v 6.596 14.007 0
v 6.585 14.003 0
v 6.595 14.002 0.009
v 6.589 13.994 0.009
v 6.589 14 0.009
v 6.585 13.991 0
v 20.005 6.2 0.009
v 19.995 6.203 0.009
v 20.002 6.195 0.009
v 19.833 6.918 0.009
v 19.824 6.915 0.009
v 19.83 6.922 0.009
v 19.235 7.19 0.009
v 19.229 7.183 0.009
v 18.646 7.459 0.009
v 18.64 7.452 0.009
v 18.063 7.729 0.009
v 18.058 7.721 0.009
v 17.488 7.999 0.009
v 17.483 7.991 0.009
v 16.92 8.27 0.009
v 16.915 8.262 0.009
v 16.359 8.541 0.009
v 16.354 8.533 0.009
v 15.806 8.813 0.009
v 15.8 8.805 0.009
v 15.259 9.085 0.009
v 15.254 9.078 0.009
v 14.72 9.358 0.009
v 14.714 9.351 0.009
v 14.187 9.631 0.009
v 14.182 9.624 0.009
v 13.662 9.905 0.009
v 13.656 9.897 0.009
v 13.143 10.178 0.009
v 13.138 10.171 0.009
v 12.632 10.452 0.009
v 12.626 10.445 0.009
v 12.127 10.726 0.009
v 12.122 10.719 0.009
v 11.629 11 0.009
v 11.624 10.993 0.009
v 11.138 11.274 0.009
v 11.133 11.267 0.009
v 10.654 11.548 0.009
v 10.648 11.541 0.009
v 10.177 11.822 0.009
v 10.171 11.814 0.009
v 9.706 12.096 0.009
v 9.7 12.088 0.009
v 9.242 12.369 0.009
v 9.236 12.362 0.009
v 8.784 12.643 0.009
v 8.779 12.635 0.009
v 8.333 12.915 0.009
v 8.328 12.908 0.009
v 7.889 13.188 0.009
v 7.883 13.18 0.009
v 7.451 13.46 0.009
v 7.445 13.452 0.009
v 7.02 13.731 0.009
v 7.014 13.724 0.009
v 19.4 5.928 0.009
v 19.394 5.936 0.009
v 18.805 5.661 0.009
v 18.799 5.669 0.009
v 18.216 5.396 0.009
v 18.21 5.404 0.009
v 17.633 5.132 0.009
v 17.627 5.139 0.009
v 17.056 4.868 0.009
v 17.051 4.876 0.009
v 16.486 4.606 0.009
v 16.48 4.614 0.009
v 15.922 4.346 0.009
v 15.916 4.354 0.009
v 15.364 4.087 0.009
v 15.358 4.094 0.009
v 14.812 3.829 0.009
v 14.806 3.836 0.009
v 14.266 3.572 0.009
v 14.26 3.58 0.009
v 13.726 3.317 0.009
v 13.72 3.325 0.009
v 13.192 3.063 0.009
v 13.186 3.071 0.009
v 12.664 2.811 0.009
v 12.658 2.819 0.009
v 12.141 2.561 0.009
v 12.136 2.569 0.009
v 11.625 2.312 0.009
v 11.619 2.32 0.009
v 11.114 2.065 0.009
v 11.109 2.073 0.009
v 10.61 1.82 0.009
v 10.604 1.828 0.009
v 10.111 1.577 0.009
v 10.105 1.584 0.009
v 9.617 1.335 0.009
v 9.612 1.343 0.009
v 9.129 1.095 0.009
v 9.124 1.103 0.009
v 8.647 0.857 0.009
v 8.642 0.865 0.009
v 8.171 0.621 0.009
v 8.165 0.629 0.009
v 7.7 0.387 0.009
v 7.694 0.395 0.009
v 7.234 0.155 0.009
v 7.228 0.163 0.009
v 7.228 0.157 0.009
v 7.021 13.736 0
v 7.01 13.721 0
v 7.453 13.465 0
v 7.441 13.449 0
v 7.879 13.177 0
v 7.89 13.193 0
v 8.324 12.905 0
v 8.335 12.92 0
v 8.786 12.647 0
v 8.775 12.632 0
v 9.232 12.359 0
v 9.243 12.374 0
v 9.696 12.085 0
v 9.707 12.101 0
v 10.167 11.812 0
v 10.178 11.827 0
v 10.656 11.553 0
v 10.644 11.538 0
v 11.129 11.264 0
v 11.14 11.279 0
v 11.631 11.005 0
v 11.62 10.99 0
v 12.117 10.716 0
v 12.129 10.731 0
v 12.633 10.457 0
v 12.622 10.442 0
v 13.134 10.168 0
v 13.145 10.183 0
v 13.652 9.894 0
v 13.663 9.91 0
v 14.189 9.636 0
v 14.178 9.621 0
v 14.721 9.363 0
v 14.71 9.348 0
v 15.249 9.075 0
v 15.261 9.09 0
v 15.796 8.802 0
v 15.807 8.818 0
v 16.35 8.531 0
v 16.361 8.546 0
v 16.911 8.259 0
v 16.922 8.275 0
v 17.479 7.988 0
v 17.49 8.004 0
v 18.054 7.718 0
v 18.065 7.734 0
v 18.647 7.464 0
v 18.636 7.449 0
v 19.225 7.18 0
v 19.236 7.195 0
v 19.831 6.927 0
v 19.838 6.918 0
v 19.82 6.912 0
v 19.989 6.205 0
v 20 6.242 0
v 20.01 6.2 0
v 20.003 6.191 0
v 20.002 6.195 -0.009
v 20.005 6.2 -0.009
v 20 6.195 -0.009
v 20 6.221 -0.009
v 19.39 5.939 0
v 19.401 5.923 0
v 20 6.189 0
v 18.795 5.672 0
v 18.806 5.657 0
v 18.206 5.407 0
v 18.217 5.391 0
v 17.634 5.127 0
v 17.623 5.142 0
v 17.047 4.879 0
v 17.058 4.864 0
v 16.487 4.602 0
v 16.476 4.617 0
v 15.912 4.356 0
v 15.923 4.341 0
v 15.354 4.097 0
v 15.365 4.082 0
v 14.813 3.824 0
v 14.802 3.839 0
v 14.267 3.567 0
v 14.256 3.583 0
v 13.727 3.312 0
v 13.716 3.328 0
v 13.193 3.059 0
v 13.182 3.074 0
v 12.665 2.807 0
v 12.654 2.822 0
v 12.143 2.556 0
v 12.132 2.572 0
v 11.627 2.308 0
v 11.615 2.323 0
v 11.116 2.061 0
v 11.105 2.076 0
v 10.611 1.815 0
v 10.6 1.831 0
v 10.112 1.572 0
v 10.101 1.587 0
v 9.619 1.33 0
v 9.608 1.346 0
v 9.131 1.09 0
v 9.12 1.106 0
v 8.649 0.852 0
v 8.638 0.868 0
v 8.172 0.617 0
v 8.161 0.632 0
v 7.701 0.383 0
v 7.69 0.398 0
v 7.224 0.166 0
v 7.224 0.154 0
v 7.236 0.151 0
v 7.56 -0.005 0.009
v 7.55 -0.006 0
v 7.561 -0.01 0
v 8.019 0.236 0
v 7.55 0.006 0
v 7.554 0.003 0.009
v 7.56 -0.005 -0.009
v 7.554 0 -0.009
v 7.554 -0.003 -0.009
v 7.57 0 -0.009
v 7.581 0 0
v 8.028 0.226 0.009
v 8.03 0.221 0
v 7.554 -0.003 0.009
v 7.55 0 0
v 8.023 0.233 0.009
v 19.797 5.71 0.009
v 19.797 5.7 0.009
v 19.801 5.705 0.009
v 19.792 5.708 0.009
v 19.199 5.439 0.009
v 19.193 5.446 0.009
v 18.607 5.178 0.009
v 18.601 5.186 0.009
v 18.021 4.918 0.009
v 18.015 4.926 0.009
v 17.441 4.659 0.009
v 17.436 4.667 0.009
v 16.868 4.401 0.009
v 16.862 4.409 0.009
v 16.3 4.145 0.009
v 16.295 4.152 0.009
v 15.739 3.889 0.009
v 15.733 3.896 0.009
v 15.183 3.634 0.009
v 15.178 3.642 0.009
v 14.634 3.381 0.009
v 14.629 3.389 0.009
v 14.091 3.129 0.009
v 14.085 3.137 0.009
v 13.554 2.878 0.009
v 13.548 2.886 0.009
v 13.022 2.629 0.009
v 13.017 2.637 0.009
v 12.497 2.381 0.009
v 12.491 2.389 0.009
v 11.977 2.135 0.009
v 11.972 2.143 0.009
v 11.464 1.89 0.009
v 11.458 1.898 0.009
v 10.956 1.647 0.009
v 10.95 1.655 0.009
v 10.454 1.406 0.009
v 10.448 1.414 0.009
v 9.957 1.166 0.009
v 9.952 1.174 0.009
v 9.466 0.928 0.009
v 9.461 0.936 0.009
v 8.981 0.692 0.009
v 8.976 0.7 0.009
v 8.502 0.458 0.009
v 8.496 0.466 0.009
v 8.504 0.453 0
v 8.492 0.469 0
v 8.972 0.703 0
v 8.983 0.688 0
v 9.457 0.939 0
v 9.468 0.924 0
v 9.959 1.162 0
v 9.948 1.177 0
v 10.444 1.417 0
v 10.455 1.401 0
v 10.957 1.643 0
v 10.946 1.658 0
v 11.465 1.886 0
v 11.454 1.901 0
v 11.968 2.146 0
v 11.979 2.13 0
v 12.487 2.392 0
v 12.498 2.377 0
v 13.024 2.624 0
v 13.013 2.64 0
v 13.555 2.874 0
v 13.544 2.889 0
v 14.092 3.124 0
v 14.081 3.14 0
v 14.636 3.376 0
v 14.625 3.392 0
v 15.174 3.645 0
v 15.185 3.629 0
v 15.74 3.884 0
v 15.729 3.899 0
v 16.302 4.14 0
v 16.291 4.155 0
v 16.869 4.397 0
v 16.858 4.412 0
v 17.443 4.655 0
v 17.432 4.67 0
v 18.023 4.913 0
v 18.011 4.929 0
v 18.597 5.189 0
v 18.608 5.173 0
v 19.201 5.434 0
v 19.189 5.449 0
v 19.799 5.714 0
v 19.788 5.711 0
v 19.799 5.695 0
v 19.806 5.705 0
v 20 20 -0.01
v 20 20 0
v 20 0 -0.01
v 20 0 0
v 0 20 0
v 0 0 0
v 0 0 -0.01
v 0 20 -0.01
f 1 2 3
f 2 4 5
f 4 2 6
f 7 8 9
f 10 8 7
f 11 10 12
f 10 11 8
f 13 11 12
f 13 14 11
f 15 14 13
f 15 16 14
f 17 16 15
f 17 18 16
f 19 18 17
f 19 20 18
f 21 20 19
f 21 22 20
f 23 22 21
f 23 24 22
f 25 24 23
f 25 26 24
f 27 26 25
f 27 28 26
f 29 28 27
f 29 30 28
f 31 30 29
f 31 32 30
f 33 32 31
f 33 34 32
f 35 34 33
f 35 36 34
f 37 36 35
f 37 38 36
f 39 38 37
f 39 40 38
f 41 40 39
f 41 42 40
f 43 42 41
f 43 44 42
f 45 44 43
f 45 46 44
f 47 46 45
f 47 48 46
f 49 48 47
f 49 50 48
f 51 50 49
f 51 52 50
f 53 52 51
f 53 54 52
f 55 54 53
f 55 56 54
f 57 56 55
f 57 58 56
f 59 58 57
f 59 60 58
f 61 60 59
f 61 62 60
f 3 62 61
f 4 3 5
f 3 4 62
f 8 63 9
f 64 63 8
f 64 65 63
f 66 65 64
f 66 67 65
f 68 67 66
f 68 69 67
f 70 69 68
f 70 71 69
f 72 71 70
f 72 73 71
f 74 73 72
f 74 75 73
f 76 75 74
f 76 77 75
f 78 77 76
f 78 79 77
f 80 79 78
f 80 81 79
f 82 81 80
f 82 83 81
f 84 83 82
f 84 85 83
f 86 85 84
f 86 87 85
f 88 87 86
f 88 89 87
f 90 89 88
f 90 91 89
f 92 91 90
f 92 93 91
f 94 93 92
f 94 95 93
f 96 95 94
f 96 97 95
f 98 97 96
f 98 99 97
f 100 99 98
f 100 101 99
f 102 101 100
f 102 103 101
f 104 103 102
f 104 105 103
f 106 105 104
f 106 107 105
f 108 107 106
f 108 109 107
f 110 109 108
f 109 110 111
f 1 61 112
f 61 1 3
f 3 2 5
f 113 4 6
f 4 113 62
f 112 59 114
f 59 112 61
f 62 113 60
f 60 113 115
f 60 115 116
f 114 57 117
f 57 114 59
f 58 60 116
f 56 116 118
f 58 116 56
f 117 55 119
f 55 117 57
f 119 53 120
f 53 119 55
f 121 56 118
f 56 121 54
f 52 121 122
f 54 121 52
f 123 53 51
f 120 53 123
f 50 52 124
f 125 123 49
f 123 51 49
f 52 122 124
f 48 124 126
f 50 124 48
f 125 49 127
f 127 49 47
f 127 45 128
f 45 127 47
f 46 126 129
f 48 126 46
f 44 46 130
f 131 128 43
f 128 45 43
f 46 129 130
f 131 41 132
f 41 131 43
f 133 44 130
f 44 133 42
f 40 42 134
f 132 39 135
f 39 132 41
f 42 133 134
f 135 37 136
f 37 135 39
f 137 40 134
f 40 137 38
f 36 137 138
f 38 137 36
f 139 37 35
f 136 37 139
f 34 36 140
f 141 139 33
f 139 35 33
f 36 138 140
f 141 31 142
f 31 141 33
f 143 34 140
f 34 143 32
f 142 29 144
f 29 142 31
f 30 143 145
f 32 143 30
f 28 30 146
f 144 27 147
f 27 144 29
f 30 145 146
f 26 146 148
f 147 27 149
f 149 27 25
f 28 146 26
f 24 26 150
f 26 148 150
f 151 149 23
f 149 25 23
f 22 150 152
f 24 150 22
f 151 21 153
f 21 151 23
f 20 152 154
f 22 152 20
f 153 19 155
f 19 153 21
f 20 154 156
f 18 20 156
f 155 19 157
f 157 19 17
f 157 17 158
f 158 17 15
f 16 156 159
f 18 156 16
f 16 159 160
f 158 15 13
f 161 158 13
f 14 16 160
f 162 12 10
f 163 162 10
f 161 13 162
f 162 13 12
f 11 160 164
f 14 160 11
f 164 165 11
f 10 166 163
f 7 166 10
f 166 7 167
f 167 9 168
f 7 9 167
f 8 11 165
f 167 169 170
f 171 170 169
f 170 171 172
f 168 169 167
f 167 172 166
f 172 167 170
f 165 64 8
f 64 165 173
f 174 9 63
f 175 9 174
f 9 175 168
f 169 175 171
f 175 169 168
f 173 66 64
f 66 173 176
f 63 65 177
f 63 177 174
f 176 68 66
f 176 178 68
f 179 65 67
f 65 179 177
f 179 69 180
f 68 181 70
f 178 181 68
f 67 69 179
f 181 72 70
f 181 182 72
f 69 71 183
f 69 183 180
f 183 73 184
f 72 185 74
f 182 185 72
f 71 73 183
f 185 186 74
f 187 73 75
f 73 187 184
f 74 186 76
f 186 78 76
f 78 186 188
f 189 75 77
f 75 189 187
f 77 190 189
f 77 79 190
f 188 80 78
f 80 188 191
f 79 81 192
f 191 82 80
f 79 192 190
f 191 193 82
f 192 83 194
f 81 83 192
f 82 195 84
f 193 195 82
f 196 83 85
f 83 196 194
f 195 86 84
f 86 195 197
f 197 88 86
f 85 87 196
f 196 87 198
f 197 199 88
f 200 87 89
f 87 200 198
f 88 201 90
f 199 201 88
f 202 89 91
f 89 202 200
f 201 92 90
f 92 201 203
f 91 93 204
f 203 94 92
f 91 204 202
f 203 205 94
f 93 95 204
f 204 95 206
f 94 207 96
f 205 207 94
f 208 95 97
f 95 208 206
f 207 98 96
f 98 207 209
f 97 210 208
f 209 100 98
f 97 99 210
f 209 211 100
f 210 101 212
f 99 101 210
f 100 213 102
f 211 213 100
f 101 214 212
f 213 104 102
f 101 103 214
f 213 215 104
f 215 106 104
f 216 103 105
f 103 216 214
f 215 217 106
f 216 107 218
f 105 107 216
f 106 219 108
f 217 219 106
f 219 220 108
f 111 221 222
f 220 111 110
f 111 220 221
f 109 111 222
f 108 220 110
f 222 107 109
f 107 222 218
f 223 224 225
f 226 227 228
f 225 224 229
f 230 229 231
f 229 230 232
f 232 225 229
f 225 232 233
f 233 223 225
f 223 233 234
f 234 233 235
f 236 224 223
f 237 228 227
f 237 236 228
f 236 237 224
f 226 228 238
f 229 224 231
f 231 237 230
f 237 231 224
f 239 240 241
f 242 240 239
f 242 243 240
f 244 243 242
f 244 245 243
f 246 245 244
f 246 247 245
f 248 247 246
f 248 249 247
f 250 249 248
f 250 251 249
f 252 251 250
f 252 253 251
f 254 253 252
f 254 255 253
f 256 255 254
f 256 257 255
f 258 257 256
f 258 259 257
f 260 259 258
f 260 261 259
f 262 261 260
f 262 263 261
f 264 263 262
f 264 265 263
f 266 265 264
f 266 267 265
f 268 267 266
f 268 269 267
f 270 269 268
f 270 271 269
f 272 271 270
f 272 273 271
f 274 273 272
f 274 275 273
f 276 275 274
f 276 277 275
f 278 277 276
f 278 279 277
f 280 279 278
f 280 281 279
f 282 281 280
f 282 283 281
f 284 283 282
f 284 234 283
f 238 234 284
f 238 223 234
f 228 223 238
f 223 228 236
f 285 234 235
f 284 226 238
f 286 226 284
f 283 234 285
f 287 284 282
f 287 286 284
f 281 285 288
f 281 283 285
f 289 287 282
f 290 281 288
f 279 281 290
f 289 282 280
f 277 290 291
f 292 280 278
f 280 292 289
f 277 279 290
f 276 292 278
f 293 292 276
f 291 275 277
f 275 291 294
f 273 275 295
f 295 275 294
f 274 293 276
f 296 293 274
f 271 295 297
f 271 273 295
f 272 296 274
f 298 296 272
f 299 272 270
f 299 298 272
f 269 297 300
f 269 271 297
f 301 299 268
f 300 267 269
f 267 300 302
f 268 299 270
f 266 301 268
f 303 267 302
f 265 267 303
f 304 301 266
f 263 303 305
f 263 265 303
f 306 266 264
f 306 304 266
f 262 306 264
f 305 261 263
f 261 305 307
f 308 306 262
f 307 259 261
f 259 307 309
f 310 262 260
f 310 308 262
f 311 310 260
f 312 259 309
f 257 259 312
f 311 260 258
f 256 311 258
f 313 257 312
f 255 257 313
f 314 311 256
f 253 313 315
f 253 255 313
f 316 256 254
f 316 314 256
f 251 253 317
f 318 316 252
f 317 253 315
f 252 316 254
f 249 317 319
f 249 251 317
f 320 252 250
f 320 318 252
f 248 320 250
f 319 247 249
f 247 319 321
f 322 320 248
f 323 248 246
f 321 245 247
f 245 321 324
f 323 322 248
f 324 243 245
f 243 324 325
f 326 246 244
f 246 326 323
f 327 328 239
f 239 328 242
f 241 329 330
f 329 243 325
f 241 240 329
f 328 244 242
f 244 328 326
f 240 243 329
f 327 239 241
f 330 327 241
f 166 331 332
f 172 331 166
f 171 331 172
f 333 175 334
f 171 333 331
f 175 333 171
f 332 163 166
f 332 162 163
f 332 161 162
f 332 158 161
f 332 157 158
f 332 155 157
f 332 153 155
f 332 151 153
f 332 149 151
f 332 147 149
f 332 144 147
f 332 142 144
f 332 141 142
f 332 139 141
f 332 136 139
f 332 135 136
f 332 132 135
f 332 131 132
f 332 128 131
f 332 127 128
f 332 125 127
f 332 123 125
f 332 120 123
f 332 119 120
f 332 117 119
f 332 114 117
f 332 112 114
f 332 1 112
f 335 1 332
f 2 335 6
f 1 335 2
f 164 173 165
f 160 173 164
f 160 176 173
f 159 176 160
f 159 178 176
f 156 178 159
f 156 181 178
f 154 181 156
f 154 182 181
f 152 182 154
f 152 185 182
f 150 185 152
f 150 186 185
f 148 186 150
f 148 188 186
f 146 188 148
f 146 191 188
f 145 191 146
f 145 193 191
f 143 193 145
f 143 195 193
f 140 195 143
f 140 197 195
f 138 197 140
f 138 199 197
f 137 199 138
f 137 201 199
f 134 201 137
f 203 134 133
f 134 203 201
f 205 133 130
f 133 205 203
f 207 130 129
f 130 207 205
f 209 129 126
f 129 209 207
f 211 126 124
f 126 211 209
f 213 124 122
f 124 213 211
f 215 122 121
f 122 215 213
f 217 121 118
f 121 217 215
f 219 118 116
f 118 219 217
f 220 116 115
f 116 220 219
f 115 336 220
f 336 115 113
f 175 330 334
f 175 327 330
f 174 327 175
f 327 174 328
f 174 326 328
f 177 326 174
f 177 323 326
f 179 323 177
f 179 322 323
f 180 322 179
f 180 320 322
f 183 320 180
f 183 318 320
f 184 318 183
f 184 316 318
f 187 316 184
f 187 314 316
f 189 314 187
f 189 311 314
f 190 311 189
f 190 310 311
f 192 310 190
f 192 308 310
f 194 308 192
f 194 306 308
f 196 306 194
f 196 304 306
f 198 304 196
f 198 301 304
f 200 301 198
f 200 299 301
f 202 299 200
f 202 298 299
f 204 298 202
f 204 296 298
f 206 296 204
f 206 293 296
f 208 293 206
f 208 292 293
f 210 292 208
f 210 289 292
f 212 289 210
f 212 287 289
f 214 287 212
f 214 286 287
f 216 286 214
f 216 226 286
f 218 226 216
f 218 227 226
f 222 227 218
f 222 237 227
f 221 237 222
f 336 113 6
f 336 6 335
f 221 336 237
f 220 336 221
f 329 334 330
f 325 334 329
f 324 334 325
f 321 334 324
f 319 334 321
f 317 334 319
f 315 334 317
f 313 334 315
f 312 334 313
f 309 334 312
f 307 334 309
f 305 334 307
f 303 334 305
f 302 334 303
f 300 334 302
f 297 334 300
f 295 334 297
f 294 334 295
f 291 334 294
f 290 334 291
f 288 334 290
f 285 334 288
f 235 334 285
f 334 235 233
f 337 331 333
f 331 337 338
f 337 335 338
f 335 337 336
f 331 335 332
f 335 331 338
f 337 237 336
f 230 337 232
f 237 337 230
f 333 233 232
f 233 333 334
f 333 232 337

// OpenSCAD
hull(){
    translate([6.593080603851629, 13.997372759850448]) sphere(0.01);
    translate([7.018051089000896, 13.72650216956947]) sphere(0.01);
}
hull(){
    translate([7.018051089000896, 13.72650216956947]) sphere(0.01);
    translate([7.449453695300672, 13.455048912321708]) sphere(0.01);
}
hull(){
    translate([7.449453695300672, 13.455048912321708]) sphere(0.01);
    translate([7.887326191868412, 13.183072437408631]) sphere(0.01);
}
hull(){
    translate([7.887326191868412, 13.183072437408631]) sphere(0.01);
    translate([8.33170623549758, 12.910632112323151]) sphere(0.01);
}
hull(){
    translate([8.33170623549758, 12.910632112323151]) sphere(0.01);
    translate([8.782631360349548, 12.637787204404422]) sphere(0.01);
}
hull(){
    translate([8.782631360349548, 12.637787204404422]) sphere(0.01);
    translate([9.240139967411437, 12.364596862042726]) sphere(0.01);
}
hull(){
    translate([9.240139967411437, 12.364596862042726]) sphere(0.01);
    translate([9.70426931373031, 12.09112009643124]) sphere(0.01);
}
hull(){
    translate([9.70426931373031, 12.09112009643124]) sphere(0.01);
    translate([10.17505750141159, 11.817415763873006]) sphere(0.01);
}
hull(){
    translate([10.17505750141159, 11.817415763873006]) sphere(0.01);
    translate([10.65254246638567, 11.543542548691558]) sphere(0.01);
}
hull(){
    translate([10.65254246638567, 11.543542548691558]) sphere(0.01);
    translate([11.13676296773269, 11.269559945779926]) sphere(0.01);
}
hull(){
    translate([11.13676296773269, 11.269559945779926]) sphere(0.01);
    translate([11.62775757655996, 10.995526243887356]) sphere(0.01);
}
hull(){
    translate([11.62775757655996, 10.995526243887356]) sphere(0.01);
    translate([12.125564665464593, 10.721499507658832]) sphere(0.01);
}
hull(){
    translate([12.125564665464593, 10.721499507658832]) sphere(0.01);
    translate([12.63022239757511, 10.44753755940701]) sphere(0.01);
}
hull(){
    translate([12.63022239757511, 10.44753755940701]) sphere(0.01);
    translate([13.1417687151918, 10.173697960605157]) sphere(0.01);
}
hull(){
    translate([13.1417687151918, 10.173697960605157]) sphere(0.01);
    translate([13.66024132801563, 9.900037992040167]) sphere(0.01);
}
hull(){
    translate([13.66024132801563, 9.900037992040167]) sphere(0.01);
    translate([14.185677701953123, 9.626614634637745]) sphere(0.01);
}
hull(){
    translate([14.185677701953123, 9.626614634637745]) sphere(0.01);
    translate([14.71811504749179, 9.353484549953267]) sphere(0.01);
}
hull(){
    translate([14.71811504749179, 9.353484549953267]) sphere(0.01);
    translate([15.257590308655642, 9.080704060345278]) sphere(0.01);
}
hull(){
    translate([15.257590308655642, 9.080704060345278]) sphere(0.01);
    translate([15.804140151544567, 8.808329129854275]) sphere(0.01);
}
hull(){
    translate([15.804140151544567, 8.808329129854275]) sphere(0.01);
    translate([16.35780095344874, 8.536415345794236]) sphere(0.01);
}
hull(){
    translate([16.35780095344874, 8.536415345794236]) sphere(0.01);
    translate([16.918608792547715, 8.265017900946672]) sphere(0.01);
}
hull(){
    translate([16.918608792547715, 8.265017900946672]) sphere(0.01);
    translate([17.48659943718601, 7.994191575280972]) sphere(0.01);
}
hull(){
    translate([17.48659943718601, 7.994191575280972]) sphere(0.01);
    translate([18.06180833573188, 7.723990715240099]) sphere(0.01);
}
hull(){
    translate([18.06180833573188, 7.723990715240099]) sphere(0.01);
    translate([18.644270606010235, 7.454469212598916]) sphere(0.01);
}
hull(){
    translate([18.644270606010235, 7.454469212598916]) sphere(0.01);
    translate([19.2330210243215, 7.185680483785434]) sphere(0.01);
}
hull(){
    translate([19.2330210243215, 7.185680483785434]) sphere(0.01);
    translate([19.828094015047945, 6.917677448673212]) sphere(0.01);
}
hull(){
    translate([19.828094015047945, 6.917677448673212]) sphere(0.01);
    translate([20, 6.200194318034836]) sphere(0.01);
}
hull(){
    translate([20, 6.200194318034836]) sphere(0.01);
    translate([19.39835555251541, 5.932632176928937]) sphere(0.01);
}
hull(){
    translate([19.39835555251541, 5.932632176928937]) sphere(0.01);
    translate([18.803042070620354, 5.666095997789184]) sphere(0.01);
}
hull(){
    translate([18.803042070620354, 5.666095997789184]) sphere(0.01);
    translate([18.214024488948333, 5.400637018043313]) sphere(0.01);
}
hull(){
    translate([18.214024488948333, 5.400637018043313]) sphere(0.01);
    translate([17.63126722459751, 5.136305965339365]) sphere(0.01);
}
hull(){
    translate([17.63126722459751, 5.136305965339365]) sphere(0.01);
    translate([17.054734200330167, 4.873153057214062]) sphere(0.01);
}
hull(){
    translate([17.054734200330167, 4.873153057214062]) sphere(0.01);
    translate([16.48438886824847, 4.611228001999039]) sphere(0.01);
}
hull(){
    translate([16.48438886824847, 4.611228001999039]) sphere(0.01);
    translate([15.920194234046775, 4.350579998972066]) sphere(0.01);
}
hull(){
    translate([15.920194234046775, 4.350579998972066]) sphere(0.01);
    translate([15.362112881835163, 4.091257738774548]) sphere(0.01);
}
hull(){
    translate([15.362112881835163, 4.091257738774548]) sphere(0.01);
    translate([14.810107000549111, 3.8333094041040505]) sphere(0.01);
}
hull(){
    translate([14.810107000549111, 3.8333094041040505]) sphere(0.01);
    translate([14.264138410959891, 3.5767826706660593]) sphere(0.01);
}
hull(){
    translate([14.264138410959891, 3.5767826706660593]) sphere(0.01);
    translate([13.724168592318541, 3.321724708369689]) sphere(0.01);
}
hull(){
    translate([13.724168592318541, 3.321724708369689]) sphere(0.01);
    translate([13.190158708618863, 3.0681821827726203]) sphere(0.01);
}
hull(){
    translate([13.190158708618863, 3.0681821827726203]) sphere(0.01);
    translate([12.662069633495255, 2.8162012567827563]) sphere(0.01);
}
hull(){
    translate([12.662069633495255, 2.8162012567827563]) sphere(0.01);
    translate([12.139861974718963, 2.565827592619768]) sphere(0.01);
}
hull(){
    translate([12.139861974718963, 2.565827592619768]) sphere(0.01);
    translate([11.623496098290085, 2.317106353063827]) sphere(0.01);
}
hull(){
    translate([11.623496098290085, 2.317106353063827]) sphere(0.01);
    translate([11.112932152146078, 2.070082203005421]) sphere(0.01);
}
hull(){
    translate([11.112932152146078, 2.070082203005421]) sphere(0.01);
    translate([10.608130090483517, 1.824799311273259]) sphere(0.01);
}
hull(){
    translate([10.608130090483517, 1.824799311273259]) sphere(0.01);
    translate([10.10904969869316, 1.581301351810311]) sphere(0.01);
}
hull(){
    translate([10.10904969869316, 1.581301351810311]) sphere(0.01);
    translate([9.61565061792729, 1.33963150418169]) sphere(0.01);
}
hull(){
    translate([9.61565061792729, 1.33963150418169]) sphere(0.01);
    translate([9.127892369319833, 1.099832454396462]) sphere(0.01);
}
hull(){
    translate([9.127892369319833, 1.099832454396462]) sphere(0.01);
    translate([8.645734378855355, 0.8619463959560995]) sphere(0.01);
}
hull(){
    translate([8.645734378855355, 0.8619463959560995]) sphere(0.01);
    translate([8.169135999911331, 0.6260150311267887]) sphere(0.01);
}
hull(){
    translate([8.169135999911331, 0.6260150311267887]) sphere(0.01);
    translate([7.698056536477678, 0.39207957241689007]) sphere(0.01);
}
hull(){
    translate([7.698056536477678, 0.39207957241689007]) sphere(0.01);
    translate([7.232455265943783, 0.16018074425561954]) sphere(0.01);
}
hull(){
    translate([7.558404358256067, 0]) sphere(0.01);
    translate([8.026691414100577, 0.230468500295968]) sphere(0.01);
}
hull(){
    translate([8.026691414100577, 0.230468500295968]) sphere(0.01);
    translate([8.500517454814508, 0.4628557967023971]) sphere(0.01);
}
hull(){
    translate([8.500517454814508, 0.4628557967023971]) sphere(0.01);
    translate([8.979923604881677, 0.6971224117804256]) sphere(0.01);
}
hull(){
    translate([8.979923604881677, 0.6971224117804256]) sphere(0.01);
    translate([9.4649501801171, 0.933227812345843]) sphere(0.01);
}
hull(){
    translate([9.4649501801171, 0.933227812345843]) sphere(0.01);
    translate([9.955636682739486, 1.1711303914970652]) sphere(0.01);
}
hull(){
    translate([9.955636682739486, 1.1711303914970652]) sphere(0.01);
    translate([10.452021795445075, 1.4107874591340928]) sphere(0.01);
}
hull(){
    translate([10.452021795445075, 1.4107874591340928]) sphere(0.01);
    translate([10.954143375480207, 1.6521552329038038]) sphere(0.01);
}
hull(){
    translate([10.954143375480207, 1.6521552329038038]) sphere(0.01);
    translate([11.462038449711006, 1.8951888295318726]) sphere(0.01);
}
hull(){
    translate([11.462038449711006, 1.8951888295318726]) sphere(0.01);
    translate([11.975743210687796, 2.139842255528699]) sphere(0.01);
}
hull(){
    translate([11.975743210687796, 2.139842255528699]) sphere(0.01);
    translate([12.495293013705632, 2.386068397264572]) sphere(0.01);
}
hull(){
    translate([12.495293013705632, 2.386068397264572]) sphere(0.01);
    translate([13.020722373860774, 2.63381801143162]) sphere(0.01);
}
hull(){
    translate([13.020722373860774, 2.63381801143162]) sphere(0.01);
    translate([13.552064962106957, 2.883039716853863]) sphere(0.01);
}
hull(){
    translate([13.552064962106957, 2.883039716853863]) sphere(0.01);
    translate([14.089353601311615, 3.133679985657369]) sphere(0.01);
}
hull(){
    translate([14.089353601311615, 3.133679985657369]) sphere(0.01);
    translate([14.63262026230892, 3.385683134788549]) sphere(0.01);
}
hull(){
    translate([14.63262026230892, 3.385683134788549]) sphere(0.01);
    translate([15.181896060954514, 3.638991318871879]) sphere(0.01);
}
hull(){
    translate([15.181896060954514, 3.638991318871879]) sphere(0.01);
    translate([15.73721125516223, 3.8935445233940102]) sphere(0.01);
}
hull(){
    translate([15.73721125516223, 3.8935445233940102]) sphere(0.01);
    translate([16.29859524292697, 4.149280558208351]) sphere(0.01);
}
hull(){
    translate([16.29859524292697, 4.149280558208351]) sphere(0.01);
    translate([16.8660765593398, 4.406135051202367]) sphere(0.01);
}
hull(){
    translate([16.8660765593398, 4.406135051202367]) sphere(0.01);
    translate([17.439682873595213, 4.664041442165367]) sphere(0.01);
}
hull(){
    translate([17.439682873595213, 4.664041442165367]) sphere(0.01);
    translate([18.019440986995004, 4.922930976898305]) sphere(0.01);
}
hull(){
    translate([18.019440986995004, 4.922930976898305]) sphere(0.01);
    translate([18.60537683095116, 5.182732700553827]) sphere(0.01);
}
hull(){
    translate([18.60537683095116, 5.182732700553827]) sphere(0.01);
    translate([19.19751546499027, 5.443373449212552]) sphere(0.01);
}
hull(){
    translate([19.19751546499027, 5.443373449212552]) sphere(0.01);
    translate([19.795881074758103, 5.704777842615692]) sphere(0.01);
}
translate([0,0,-0.01]) color([0.1,0.1,0.1]) cube([20,20,0.01]);
